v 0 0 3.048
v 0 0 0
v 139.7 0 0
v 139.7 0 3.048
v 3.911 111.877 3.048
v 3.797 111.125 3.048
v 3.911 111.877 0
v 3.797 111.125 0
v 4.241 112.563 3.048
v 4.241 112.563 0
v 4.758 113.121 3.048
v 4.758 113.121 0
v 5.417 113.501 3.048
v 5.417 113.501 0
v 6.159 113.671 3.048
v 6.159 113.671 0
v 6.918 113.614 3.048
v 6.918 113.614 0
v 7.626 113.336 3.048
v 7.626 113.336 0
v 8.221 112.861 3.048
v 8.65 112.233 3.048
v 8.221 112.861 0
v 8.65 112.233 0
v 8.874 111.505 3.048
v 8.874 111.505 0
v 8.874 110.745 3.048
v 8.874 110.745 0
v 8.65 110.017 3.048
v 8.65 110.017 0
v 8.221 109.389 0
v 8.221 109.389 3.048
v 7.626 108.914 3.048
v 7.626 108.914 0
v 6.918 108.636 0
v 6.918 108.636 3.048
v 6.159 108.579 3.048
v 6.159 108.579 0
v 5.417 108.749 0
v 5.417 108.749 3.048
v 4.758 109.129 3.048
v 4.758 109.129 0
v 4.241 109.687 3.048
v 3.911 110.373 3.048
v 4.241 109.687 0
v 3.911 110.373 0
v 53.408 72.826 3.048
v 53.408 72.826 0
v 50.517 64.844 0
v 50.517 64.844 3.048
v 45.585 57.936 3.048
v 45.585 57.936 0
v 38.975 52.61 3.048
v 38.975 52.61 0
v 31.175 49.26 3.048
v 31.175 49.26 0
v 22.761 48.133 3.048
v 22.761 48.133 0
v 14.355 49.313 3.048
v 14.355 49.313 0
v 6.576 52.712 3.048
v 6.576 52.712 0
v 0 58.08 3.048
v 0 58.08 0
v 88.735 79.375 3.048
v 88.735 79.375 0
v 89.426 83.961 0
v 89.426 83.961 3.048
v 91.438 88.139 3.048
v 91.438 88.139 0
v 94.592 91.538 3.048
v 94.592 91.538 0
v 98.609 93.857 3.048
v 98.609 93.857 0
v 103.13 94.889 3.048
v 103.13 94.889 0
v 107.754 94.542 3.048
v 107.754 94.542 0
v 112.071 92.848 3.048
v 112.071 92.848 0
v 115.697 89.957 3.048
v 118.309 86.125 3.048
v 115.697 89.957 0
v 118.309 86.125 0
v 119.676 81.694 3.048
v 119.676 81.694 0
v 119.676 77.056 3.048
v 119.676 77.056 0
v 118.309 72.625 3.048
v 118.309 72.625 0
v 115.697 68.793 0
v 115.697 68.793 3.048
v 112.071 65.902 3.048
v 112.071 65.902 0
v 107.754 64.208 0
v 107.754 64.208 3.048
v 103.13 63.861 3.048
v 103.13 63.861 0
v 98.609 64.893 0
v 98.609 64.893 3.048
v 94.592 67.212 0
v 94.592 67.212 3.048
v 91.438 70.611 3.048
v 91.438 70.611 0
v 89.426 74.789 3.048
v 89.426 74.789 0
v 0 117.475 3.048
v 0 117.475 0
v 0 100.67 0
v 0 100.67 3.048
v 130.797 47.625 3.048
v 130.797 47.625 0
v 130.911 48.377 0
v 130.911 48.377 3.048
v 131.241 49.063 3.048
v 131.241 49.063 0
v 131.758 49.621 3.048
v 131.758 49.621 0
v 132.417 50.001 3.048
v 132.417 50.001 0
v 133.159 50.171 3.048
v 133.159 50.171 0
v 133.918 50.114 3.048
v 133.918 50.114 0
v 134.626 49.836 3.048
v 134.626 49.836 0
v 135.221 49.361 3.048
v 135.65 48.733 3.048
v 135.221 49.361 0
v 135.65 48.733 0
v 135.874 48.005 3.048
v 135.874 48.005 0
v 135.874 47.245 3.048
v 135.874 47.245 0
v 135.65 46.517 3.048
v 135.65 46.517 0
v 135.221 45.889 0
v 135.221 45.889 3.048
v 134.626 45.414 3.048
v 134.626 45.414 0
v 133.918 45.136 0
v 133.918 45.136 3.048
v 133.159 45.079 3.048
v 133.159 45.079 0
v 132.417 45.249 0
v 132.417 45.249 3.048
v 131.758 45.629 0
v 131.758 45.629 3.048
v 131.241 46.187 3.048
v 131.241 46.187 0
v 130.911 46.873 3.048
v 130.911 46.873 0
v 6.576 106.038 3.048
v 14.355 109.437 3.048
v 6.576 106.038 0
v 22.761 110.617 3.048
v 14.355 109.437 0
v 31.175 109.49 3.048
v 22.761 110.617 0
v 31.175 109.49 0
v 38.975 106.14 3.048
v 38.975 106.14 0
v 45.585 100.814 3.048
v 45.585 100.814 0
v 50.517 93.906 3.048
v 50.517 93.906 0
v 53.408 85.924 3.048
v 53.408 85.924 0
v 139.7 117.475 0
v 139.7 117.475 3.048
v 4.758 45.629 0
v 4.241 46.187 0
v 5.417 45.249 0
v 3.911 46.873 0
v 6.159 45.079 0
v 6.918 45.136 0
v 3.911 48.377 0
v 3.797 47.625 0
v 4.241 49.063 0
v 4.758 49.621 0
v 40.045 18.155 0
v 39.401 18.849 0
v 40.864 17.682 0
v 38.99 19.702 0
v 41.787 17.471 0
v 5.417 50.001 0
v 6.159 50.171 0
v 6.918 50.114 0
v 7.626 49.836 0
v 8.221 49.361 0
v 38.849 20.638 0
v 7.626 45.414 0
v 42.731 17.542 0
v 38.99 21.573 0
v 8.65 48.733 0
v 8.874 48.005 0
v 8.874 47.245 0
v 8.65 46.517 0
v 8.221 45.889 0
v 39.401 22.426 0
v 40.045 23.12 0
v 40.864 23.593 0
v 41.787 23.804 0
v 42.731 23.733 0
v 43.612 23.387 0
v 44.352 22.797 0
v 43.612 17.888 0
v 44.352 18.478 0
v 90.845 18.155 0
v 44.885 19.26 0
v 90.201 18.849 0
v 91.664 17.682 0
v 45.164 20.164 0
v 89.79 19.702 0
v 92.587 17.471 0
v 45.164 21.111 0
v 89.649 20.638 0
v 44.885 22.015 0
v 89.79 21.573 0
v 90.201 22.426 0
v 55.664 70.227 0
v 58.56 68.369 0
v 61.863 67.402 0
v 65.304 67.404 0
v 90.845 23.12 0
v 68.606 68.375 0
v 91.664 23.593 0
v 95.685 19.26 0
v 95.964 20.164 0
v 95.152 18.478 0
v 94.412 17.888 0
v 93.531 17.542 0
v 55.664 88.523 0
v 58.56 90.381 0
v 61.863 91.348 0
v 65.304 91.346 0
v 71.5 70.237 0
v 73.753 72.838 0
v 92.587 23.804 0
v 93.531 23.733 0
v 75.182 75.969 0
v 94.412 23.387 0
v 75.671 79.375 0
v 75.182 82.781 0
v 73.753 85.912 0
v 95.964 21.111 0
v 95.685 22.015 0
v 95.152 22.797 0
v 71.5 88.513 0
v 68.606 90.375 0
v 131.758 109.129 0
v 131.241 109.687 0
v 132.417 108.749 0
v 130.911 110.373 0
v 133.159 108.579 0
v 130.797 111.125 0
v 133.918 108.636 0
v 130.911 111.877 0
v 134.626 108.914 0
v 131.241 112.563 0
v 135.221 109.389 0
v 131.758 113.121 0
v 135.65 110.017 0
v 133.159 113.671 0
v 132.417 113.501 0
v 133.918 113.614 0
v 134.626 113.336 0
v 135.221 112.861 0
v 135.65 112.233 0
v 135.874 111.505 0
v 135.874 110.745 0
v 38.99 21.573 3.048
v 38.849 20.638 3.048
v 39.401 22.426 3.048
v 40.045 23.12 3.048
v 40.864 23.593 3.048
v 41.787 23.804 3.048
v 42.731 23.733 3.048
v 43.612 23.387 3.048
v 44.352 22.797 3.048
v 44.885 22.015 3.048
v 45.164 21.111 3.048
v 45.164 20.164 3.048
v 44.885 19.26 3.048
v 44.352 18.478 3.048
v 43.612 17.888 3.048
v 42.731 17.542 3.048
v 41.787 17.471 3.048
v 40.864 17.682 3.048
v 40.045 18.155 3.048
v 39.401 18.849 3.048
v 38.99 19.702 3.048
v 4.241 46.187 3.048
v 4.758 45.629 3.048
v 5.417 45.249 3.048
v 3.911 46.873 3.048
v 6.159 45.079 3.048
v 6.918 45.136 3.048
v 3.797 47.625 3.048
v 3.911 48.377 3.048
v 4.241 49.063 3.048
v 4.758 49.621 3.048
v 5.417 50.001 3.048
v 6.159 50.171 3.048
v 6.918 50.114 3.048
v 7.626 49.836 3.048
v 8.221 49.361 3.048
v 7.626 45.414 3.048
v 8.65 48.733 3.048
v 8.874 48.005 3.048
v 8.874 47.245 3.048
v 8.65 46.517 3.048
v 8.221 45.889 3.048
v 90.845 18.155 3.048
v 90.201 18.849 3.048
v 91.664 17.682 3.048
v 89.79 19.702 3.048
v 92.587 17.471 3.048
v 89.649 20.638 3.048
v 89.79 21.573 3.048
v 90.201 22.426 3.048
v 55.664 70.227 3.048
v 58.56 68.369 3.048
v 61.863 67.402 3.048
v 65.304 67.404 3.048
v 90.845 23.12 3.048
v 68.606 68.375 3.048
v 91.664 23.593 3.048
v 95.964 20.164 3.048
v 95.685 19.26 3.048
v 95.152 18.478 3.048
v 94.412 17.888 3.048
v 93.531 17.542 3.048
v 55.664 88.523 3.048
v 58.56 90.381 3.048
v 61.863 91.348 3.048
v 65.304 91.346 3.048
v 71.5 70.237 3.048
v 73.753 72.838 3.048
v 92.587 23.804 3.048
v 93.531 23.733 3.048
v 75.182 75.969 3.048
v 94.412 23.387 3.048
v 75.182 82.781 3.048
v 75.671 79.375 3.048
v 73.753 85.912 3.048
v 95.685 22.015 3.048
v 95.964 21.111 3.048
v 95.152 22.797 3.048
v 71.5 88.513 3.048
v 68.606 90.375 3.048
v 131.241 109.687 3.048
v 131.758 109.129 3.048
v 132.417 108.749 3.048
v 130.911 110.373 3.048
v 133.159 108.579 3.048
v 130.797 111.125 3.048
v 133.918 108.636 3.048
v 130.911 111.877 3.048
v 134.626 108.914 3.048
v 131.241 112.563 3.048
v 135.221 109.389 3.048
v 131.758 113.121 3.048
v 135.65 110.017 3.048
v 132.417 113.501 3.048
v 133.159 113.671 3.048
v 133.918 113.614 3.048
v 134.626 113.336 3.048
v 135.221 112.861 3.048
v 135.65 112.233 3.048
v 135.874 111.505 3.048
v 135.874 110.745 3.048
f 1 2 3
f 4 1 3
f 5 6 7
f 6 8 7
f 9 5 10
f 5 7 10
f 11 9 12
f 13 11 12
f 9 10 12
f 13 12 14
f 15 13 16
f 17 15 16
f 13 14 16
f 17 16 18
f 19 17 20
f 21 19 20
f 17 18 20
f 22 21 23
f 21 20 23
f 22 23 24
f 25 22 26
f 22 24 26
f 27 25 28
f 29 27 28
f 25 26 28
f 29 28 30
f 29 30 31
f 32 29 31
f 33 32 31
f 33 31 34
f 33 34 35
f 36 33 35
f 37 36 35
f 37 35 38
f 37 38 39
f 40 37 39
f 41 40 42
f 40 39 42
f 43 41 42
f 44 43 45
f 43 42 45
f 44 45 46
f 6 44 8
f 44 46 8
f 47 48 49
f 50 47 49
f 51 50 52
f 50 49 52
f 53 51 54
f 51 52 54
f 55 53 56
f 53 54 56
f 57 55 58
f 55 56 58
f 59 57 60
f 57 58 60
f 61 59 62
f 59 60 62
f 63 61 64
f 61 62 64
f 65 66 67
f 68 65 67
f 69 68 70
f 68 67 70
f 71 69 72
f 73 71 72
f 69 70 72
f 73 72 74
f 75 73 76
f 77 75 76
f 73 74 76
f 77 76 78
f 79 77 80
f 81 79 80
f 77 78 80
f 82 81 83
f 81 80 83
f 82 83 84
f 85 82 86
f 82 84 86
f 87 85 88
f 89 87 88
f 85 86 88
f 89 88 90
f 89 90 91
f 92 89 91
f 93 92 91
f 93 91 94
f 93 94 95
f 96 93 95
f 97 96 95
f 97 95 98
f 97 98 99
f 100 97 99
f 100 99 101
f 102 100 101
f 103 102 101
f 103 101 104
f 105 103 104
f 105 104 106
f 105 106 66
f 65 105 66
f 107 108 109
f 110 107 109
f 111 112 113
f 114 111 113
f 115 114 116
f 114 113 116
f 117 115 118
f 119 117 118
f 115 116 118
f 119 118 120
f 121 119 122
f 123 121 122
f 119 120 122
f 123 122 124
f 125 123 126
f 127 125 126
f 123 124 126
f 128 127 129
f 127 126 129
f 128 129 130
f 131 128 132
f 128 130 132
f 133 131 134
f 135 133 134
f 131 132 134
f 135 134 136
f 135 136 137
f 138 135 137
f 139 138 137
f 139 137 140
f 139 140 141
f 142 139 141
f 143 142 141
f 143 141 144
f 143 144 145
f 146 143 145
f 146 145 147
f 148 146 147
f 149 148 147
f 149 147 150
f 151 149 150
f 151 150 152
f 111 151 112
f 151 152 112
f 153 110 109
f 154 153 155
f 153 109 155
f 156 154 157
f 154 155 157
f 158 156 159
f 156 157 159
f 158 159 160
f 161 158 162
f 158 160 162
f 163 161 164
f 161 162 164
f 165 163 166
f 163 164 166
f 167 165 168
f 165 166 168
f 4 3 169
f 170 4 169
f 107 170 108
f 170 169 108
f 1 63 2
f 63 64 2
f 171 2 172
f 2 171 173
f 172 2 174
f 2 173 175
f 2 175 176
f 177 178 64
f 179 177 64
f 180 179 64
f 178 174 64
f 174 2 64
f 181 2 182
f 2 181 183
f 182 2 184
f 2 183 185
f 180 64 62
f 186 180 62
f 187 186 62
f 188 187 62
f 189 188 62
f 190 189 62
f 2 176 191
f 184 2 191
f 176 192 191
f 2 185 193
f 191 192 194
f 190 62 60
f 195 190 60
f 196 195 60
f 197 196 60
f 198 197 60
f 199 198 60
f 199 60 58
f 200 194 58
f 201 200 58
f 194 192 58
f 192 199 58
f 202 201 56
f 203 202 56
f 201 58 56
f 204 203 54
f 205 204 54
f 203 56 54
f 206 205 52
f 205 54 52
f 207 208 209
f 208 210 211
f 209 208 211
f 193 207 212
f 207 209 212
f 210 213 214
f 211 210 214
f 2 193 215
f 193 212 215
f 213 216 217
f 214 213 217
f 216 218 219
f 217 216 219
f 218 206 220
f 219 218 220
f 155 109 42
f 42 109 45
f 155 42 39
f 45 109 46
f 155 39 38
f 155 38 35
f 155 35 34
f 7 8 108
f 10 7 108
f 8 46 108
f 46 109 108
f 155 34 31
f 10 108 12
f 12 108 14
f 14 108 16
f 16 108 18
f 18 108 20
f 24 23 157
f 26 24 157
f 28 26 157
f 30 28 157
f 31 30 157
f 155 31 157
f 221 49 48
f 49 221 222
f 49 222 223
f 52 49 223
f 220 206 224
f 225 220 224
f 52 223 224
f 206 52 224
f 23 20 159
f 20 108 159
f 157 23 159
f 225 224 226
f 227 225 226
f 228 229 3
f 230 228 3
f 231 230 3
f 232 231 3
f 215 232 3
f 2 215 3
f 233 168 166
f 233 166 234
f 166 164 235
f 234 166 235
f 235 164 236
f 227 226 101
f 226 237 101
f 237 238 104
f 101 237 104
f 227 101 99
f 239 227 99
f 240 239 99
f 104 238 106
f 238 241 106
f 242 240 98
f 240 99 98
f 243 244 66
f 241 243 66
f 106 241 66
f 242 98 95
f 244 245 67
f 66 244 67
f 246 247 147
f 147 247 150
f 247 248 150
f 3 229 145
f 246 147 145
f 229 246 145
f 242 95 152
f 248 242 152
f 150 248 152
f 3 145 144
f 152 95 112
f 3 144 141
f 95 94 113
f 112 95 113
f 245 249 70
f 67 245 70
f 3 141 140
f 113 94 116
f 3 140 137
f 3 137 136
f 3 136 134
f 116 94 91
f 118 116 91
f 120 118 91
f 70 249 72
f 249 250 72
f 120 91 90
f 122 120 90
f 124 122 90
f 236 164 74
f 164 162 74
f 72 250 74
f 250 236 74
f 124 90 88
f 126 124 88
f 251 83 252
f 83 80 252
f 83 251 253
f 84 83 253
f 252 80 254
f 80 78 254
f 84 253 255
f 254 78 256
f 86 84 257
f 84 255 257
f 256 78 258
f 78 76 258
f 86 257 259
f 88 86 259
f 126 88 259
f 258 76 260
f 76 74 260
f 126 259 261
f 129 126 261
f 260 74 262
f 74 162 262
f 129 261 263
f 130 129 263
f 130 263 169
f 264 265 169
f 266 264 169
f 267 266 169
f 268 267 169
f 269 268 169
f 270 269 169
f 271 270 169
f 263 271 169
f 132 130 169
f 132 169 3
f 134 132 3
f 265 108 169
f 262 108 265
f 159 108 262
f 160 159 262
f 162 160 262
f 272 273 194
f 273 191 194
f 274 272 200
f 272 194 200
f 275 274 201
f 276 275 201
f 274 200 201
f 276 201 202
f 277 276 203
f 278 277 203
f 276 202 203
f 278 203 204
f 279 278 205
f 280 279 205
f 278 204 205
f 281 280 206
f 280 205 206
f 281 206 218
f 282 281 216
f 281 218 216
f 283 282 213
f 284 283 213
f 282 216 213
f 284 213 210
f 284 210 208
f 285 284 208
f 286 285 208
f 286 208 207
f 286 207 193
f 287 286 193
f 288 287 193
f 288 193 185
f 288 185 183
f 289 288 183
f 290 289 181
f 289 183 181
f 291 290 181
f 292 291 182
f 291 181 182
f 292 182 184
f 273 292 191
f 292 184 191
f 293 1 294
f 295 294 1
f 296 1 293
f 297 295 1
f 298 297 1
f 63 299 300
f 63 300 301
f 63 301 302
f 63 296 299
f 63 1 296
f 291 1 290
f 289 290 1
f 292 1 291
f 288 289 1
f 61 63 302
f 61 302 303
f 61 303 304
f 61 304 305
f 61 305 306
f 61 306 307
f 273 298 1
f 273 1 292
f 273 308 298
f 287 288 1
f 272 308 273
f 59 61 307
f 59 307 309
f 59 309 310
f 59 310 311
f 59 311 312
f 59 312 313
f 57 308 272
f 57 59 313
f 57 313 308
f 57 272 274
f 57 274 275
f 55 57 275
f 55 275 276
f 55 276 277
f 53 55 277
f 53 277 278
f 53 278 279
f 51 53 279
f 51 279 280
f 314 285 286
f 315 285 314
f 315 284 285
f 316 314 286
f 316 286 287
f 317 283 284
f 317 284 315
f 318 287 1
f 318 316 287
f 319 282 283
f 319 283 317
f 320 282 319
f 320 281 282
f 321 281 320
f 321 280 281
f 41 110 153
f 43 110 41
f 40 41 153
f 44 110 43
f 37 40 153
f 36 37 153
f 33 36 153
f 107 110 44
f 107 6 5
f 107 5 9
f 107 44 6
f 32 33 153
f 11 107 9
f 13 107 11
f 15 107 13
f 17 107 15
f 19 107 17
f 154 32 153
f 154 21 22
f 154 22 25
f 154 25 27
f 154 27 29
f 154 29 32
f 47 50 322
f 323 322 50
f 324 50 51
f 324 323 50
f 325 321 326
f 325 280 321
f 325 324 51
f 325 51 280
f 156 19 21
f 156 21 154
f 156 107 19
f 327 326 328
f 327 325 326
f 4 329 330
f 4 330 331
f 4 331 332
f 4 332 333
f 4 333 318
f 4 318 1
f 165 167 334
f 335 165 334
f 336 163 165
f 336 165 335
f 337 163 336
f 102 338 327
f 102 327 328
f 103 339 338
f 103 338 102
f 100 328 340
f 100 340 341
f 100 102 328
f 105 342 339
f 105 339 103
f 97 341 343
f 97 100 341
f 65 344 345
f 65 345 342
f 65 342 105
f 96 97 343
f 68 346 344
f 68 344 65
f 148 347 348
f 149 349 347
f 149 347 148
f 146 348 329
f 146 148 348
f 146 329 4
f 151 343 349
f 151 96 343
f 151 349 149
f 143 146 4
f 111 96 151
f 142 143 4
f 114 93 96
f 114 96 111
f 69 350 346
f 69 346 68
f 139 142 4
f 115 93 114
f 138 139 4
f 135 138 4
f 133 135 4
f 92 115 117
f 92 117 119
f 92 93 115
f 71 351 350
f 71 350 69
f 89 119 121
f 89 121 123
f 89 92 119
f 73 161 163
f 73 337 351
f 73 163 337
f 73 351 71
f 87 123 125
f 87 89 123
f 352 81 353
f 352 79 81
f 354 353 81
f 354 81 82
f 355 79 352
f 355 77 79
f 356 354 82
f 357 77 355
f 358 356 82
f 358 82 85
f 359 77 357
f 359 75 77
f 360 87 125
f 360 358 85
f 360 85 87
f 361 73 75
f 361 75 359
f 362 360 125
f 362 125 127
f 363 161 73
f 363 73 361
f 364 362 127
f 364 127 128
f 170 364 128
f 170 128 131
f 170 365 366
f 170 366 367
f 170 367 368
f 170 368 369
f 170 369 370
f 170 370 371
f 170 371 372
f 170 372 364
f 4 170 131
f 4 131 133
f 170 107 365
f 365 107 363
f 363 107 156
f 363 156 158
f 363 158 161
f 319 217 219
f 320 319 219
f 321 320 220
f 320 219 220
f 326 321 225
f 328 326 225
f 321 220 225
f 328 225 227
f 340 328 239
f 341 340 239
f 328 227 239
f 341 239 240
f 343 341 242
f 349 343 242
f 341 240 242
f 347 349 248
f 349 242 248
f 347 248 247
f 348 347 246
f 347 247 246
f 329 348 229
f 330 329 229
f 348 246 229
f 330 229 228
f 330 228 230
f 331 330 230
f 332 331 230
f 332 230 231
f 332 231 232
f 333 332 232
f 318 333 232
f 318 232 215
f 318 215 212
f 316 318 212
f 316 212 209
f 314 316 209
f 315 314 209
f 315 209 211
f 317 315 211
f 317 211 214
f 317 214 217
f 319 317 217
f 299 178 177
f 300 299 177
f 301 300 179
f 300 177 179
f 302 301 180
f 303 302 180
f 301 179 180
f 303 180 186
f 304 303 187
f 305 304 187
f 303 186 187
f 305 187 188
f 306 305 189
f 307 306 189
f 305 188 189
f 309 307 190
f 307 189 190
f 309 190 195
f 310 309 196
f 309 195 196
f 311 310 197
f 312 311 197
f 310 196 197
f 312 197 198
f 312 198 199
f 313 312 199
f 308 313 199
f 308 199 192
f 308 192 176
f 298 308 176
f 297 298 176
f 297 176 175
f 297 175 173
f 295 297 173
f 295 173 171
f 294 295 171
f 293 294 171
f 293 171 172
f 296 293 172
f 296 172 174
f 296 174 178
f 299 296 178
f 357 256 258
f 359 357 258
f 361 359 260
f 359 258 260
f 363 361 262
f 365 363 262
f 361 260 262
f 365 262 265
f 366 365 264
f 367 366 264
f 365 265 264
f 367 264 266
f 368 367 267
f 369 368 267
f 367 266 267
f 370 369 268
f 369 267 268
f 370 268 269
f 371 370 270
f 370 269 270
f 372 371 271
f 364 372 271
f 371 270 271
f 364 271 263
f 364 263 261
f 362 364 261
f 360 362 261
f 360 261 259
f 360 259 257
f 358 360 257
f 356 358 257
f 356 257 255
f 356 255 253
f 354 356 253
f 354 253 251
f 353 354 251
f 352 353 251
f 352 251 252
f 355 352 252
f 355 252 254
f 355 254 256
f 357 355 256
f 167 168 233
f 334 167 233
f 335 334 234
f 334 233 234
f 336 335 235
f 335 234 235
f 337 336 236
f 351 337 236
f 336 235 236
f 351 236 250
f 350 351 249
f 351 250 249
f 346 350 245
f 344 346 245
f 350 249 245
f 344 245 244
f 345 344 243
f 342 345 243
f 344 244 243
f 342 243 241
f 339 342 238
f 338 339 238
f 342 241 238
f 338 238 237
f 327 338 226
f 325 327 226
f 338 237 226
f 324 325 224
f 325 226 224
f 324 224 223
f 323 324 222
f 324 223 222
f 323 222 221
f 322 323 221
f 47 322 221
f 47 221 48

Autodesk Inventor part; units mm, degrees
ref_plane "YZ Plane" through (0, 0, 0) normal (1, 0, 0) x (0, 1, 0)
ref_plane "XZ Plane" through (0, 0, 0) normal (0, 1, 0) x (-1, 0, 0)
ref_plane "XY Plane" through (0, 0, 0) normal (0, 0, 1) x (1, 0, 0)
sketch "Sketch1" plane through (0, 0, 0) normal (0, 0, 1) x (1, 0, 0)
  line L0 (0, 0) -> (139.7, 0)
  line L1 (139.7, 0) -> (139.7, 117.475)
  line L2 (139.7, 117.475) -> (0, 117.475)
  line L3 (0, 117.475) -> (0, 0)
  dimension "d0" = 139.7
  dimension "d1" = 117.475
extrude "Plate3" add sketch "Sketch1" along normal blind 3.048
sketch "Sketch4" plane through (0, 0, 0) normal (0, 0, -1) x (-1, 0, 0)
  circle A0 centre (-22.86, 79.375) radius 31.242
  circle A1 centre (-6.35, 111.125) radius 2.5527
  circle A2 centre (-6.35, 47.625) radius 2.5527
  circle A3 centre (-133.35, 111.125) radius 2.5527
  circle A4 centre (-133.35, 47.625) radius 2.5527
  arc A5 (-136.4869, 13.4874) -> (-136.4869, 27.7876) centre (-136.4869, 20.6375) ccw
  line L0 (-150.7617, 27.7876) -> (-136.4869, 27.7876)
  line L1 (-136.4869, 13.4874) -> (-150.7617, 13.4874)
  arc A6 (-99.9617, 27.7876) -> (-99.9617, 13.4874) centre (-99.9617, 20.6375) ccw
  line L2 (-99.9617, 27.7876) -> (-85.6869, 27.7876)
  line L3 (-85.6869, 13.4874) -> (-99.9617, 13.4874)
  arc A7 (-85.6869, 13.4874) -> (-85.6869, 27.7876) centre (-85.6869, 20.6375) ccw
  arc A8 (-49.1617, 27.7876) -> (-49.1617, 13.4874) centre (-49.1617, 20.6375) ccw
  line L4 (-49.1617, 27.7876) -> (-34.8869, 27.7876)
  arc A9 (-34.8869, 13.4874) -> (-34.8869, 27.7876) centre (-34.8869, 20.6375) ccw
  line L5 (-34.8869, 13.4874) -> (-49.1617, 13.4874)
  arc A10 (1.6383, 27.7876) -> (1.6383, 13.4874) centre (1.6383, 20.6375) ccw
  line L6 (1.6383, 27.7876) -> (15.9131, 27.7876)
  line L7 (15.9131, 13.4874) -> (1.6383, 13.4874)
  arc A11 (15.9131, 13.4874) -> (15.9131, 27.7876) centre (15.9131, 20.6375) ccw
  circle A12 centre (-104.2924, 79.375) radius 15.5575
  circle A13 centre (-63.5762, 79.375) radius 12.095
  circle A14 centre (-22.86, 79.375) radius 31.242
  circle A15 centre (-6.35, 47.625) radius 2.5527
  circle A16 centre (-63.5762, 79.375) radius 12.095
  circle A17 centre (-104.2924, 79.375) radius 15.5575
  circle A18 centre (-133.35, 111.125) radius 2.5527
  circle A19 centre (-133.35, 47.625) radius 2.5527
  circle A20 centre (-6.35, 111.125) radius 2.5527
  circle A21 centre (-92.8243, 20.6375) radius 3.175
  circle A22 centre (-42.0243, 20.6375) radius 3.175
  point P0 (0, 0)
  dimension "d16" = 7.1501
  dimension "d17" = 7.1501
  dimension "d18" = 7.1374
  dimension "d19" = 7.1374
  dimension "d20" = 6.35
  dimension "d21" = 6.35
extrude "Cut1" cut sketch "Sketch4" against normal blind 3.048 contours A0 A13 | A13 A0 | A0 A13 | A1 | A2 | A3 | A4 | A12 | A21 | A22
equation "\"d12\" = Thickness"
equation "\"BendRadius\" = Thickness"
equation "\"BendReliefWidth\" = Thickness"
equation "\"BendReliefDepth\" = 0.5 * Thickness"
equation "\"CornerReliefSize\" = 4 * Thickness"
equation "\"MinimumRemnant\" = 2 * Thickness"
equation "\"TransitionRadius\" = BendRadius"
equation "\"JacobiRadiusSize\" = BendRadius"
equation "\"GapSize\" = Thickness"
equation "\"d2\" = BendRadius"
equation "\"d3\" = BendRadius"
equation "\"d4\" = BendRadius"
equation "\"Thickness\" = 3.048"
properties part number "attatching plate for toughbox"
